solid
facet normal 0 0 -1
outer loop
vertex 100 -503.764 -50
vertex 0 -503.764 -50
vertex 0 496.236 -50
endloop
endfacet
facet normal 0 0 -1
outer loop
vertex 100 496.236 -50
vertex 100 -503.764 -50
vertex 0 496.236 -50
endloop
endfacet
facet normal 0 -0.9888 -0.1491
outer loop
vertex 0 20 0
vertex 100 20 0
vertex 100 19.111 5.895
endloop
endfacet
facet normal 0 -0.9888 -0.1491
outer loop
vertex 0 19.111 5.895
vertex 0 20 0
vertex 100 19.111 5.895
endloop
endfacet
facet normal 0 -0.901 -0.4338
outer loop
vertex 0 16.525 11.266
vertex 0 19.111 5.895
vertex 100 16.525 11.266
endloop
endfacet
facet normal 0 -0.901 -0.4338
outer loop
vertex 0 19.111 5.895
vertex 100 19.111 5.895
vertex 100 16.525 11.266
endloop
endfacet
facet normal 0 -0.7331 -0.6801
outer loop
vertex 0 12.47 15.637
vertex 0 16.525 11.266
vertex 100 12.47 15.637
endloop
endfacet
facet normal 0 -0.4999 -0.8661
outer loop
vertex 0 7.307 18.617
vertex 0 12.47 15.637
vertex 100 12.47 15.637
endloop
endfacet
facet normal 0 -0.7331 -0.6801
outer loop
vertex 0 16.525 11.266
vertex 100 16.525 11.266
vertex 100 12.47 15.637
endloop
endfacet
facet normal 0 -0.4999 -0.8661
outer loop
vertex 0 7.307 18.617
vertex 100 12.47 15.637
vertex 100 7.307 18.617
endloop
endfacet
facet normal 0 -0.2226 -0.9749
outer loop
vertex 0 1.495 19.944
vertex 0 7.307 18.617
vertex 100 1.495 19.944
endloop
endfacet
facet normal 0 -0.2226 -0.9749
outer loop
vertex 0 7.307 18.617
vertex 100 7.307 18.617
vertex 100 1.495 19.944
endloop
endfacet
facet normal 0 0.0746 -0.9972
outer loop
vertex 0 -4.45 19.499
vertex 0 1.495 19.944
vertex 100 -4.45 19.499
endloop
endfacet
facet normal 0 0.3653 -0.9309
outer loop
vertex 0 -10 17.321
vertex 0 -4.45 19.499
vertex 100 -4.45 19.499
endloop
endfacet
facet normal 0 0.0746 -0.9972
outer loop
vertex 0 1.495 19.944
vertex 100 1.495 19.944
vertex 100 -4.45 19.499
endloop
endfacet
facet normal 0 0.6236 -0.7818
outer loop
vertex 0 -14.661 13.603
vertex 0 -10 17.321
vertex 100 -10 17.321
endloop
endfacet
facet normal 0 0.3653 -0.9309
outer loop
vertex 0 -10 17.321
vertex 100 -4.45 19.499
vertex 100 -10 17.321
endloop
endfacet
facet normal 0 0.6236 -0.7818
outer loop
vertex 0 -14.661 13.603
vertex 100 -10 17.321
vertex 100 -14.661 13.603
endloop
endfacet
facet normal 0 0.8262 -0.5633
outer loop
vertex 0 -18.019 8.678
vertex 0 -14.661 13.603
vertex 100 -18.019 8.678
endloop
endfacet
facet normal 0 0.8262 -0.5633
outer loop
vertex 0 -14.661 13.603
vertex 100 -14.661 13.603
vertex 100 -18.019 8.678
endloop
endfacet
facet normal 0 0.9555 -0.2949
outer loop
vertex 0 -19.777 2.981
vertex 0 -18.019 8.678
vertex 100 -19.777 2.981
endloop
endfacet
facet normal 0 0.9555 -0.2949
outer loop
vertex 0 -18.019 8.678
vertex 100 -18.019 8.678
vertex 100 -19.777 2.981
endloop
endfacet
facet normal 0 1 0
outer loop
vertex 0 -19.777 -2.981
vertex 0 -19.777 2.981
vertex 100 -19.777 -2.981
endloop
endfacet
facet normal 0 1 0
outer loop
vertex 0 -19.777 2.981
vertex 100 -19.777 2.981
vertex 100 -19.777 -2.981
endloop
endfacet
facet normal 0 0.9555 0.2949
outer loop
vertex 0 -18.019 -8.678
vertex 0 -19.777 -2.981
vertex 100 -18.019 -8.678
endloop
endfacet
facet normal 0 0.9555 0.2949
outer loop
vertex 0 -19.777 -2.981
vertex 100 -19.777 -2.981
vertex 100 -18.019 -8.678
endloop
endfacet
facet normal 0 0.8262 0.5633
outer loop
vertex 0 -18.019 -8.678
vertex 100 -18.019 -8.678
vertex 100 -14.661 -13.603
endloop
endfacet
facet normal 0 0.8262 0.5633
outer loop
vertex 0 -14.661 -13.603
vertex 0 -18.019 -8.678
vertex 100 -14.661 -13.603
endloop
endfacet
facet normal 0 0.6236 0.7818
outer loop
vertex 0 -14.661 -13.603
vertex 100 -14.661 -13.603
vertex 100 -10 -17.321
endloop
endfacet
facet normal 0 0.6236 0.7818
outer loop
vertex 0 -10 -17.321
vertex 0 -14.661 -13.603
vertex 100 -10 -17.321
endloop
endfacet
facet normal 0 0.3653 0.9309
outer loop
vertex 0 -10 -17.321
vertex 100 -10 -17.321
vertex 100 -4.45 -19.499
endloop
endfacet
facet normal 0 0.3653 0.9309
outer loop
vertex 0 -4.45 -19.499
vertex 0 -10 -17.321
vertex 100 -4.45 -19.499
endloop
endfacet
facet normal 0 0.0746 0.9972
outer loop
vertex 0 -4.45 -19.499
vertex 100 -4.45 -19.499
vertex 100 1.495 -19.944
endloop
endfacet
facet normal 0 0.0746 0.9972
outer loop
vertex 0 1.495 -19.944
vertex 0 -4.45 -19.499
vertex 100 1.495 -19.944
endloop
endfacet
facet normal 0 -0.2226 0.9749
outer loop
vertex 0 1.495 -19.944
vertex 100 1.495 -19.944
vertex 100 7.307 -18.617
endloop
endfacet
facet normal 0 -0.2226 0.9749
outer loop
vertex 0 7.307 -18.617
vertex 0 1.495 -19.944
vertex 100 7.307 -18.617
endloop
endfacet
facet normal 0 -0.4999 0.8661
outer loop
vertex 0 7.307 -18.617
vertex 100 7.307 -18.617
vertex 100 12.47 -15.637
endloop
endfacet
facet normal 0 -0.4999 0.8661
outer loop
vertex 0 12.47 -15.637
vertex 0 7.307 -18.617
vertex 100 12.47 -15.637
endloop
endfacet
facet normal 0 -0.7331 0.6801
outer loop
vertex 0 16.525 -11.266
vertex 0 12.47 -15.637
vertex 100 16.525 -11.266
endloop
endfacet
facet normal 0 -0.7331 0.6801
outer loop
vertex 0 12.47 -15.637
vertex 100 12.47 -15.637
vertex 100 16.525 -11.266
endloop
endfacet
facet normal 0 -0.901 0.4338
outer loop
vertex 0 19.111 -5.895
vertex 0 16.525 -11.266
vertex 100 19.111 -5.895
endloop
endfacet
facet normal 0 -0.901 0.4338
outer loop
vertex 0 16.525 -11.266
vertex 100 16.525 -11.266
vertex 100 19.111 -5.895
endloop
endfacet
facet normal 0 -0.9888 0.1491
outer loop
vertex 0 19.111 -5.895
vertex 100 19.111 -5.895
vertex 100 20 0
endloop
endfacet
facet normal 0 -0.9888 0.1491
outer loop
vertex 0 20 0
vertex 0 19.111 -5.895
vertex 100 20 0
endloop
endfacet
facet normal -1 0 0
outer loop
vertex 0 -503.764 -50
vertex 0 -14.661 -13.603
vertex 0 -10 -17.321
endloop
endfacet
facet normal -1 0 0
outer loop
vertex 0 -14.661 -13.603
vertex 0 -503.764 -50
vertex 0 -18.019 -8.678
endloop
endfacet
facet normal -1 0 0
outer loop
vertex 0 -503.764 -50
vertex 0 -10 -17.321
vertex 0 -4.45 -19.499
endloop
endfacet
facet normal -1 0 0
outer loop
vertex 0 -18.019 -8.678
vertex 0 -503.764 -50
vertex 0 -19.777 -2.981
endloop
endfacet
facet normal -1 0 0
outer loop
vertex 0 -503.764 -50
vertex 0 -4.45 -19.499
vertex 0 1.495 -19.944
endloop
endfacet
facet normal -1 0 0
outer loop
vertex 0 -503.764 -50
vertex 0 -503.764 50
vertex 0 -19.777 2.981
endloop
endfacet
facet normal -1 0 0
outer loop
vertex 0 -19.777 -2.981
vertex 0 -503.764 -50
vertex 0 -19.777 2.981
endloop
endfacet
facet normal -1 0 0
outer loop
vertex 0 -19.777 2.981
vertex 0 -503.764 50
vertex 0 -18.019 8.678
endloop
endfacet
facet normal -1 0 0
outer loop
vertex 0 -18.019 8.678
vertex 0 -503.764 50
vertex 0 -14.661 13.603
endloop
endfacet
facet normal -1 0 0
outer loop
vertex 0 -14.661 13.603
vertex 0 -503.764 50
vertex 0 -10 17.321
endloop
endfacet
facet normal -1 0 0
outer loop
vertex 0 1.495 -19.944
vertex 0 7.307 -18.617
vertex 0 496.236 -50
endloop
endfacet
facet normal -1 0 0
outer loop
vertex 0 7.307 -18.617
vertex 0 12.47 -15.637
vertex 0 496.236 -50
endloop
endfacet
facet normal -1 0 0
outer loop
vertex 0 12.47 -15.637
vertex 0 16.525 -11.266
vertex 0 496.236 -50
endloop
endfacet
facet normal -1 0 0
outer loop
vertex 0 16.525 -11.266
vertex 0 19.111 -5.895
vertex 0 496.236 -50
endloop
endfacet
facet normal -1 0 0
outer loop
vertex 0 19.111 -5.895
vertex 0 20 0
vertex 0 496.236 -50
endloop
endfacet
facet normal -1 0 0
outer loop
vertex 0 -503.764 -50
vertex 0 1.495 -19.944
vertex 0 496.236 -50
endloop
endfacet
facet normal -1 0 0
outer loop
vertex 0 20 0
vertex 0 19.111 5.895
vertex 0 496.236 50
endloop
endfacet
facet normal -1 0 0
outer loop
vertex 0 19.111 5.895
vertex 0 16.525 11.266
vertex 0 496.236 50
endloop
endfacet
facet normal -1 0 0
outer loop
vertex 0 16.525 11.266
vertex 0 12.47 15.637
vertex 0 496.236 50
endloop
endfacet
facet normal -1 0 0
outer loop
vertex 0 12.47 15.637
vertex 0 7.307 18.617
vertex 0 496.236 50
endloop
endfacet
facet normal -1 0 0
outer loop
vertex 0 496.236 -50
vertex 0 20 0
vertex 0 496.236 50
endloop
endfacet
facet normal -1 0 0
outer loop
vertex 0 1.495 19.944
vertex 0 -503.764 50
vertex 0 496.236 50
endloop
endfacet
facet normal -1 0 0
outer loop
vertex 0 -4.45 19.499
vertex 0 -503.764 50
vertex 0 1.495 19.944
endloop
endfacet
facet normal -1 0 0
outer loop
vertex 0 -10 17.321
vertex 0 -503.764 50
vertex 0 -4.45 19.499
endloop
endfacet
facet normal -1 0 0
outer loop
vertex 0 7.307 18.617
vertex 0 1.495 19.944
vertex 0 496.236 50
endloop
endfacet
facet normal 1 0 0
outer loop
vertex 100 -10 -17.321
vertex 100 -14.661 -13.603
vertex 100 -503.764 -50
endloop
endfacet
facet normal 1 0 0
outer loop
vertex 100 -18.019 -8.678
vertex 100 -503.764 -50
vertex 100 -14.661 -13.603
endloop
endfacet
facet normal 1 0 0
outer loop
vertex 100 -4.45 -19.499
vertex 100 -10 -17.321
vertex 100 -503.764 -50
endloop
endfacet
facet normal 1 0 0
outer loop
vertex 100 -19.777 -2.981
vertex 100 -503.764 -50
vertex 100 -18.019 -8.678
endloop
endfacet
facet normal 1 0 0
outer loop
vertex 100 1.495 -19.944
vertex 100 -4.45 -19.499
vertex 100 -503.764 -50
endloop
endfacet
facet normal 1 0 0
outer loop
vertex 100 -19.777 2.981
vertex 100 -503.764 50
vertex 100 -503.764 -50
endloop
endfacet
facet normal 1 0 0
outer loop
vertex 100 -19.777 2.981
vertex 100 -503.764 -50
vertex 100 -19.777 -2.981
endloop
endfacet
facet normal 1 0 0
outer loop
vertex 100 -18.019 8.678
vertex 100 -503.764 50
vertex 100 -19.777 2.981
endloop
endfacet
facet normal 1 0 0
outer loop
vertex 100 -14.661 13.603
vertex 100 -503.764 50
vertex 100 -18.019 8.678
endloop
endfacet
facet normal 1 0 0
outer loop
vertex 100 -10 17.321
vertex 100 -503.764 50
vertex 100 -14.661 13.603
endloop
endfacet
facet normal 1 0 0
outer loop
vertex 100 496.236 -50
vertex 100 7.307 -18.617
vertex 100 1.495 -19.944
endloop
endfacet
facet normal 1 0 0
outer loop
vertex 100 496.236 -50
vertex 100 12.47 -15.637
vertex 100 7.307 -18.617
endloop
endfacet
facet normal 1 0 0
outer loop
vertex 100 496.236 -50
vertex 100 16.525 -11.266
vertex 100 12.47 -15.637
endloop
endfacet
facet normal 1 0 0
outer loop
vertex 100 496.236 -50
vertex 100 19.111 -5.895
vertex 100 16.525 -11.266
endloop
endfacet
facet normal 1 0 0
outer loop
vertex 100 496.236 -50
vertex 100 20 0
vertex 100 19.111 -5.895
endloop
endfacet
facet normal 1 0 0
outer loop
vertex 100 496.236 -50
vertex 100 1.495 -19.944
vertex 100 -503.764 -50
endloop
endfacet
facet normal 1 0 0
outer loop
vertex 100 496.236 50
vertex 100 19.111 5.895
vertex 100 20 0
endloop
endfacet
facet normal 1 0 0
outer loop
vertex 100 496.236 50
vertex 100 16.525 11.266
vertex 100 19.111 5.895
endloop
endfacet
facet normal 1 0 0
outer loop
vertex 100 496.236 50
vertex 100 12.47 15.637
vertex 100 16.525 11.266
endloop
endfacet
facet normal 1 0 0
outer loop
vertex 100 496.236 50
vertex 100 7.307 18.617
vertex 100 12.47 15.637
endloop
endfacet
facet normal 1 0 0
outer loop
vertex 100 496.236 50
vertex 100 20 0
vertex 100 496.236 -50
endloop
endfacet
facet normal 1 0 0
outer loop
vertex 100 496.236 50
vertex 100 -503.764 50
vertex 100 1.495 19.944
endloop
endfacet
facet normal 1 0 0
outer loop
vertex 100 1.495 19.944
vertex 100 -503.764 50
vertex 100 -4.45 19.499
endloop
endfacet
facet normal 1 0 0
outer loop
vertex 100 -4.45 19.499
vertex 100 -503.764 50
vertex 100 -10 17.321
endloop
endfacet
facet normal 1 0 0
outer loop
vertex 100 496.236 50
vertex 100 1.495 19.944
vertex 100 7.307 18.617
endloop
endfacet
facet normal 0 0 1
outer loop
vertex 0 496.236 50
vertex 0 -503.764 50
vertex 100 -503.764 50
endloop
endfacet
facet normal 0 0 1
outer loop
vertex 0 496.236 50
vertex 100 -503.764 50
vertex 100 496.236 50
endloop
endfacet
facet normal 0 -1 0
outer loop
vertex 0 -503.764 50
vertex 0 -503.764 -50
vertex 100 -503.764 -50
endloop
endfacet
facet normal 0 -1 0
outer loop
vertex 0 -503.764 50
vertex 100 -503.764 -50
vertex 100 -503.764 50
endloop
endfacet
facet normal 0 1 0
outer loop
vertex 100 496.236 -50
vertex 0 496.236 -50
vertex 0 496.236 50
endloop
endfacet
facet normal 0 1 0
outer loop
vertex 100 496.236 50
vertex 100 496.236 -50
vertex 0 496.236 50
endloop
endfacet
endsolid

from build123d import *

# Parameters (mm, degrees)
F0_W     = 1000
F0_H     = 100
F1_DEPTH = 100
F2_R     = 20
F3_DEPTH = 100


with BuildPart() as f1:
    # F0 (on Right) → F1 (new body)
    with BuildSketch(Plane.YZ):
        with Locations((-3.763909, 0)):
            Rectangle(F0_W, F0_H)
    extrude(amount=F1_DEPTH)

    # F2 (on face) → F3 (cut)
    with BuildSketch(Plane.YZ.offset(100)):
        Circle(F2_R)
    extrude(amount=-F3_DEPTH, mode=Mode.SUBTRACT)


solid = f1.part
